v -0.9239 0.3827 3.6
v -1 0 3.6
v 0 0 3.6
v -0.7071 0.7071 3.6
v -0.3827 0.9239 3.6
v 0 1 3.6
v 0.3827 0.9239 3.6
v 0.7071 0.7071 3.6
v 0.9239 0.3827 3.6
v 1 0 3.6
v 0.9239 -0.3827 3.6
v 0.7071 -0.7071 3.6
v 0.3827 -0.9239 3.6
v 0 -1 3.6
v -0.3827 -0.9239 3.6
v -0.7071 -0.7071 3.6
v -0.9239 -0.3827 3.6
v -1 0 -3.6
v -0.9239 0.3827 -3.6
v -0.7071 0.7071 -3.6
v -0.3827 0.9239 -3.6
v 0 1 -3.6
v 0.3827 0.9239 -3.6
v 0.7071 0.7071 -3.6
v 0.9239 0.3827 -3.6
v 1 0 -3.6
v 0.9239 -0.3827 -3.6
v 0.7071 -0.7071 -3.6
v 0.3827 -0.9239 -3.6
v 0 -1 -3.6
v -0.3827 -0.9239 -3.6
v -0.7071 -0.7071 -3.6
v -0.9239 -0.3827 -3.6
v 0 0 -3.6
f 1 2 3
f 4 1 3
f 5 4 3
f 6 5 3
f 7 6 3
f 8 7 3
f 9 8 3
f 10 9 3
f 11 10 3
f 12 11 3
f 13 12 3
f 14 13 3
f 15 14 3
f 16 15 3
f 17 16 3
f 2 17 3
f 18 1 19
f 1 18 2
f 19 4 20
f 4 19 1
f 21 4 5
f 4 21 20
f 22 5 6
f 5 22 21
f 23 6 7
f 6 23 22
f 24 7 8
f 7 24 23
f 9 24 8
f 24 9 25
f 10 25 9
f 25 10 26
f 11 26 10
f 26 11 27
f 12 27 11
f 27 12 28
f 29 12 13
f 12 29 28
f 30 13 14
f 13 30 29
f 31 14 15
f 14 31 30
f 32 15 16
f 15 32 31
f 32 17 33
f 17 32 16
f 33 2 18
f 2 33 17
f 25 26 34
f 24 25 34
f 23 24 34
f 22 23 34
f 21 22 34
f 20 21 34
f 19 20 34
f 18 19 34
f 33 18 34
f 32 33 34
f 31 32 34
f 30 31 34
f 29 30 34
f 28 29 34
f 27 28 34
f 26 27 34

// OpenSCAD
// file: ../p/4-4edge.scad
use <../lib.scad>
function ldraw_lib__4_4edge() = [
// 0 Circle 1.0
// 0 Name: 4-4edge.dat
// 0 Author: James Jessiman
// 0 !LDRAW_ORG Primitive UPDATE 2017-01
// 0 !LICENSE Licensed under CC BY 2.0 and CC BY 4.0 : see CAreadme.txt
// 
// 0 BFC CERTIFY CCW
  [0,"BFC","CERTIFY"],
  [0,"BFC","CCW"],
// 
// 0 !HISTORY 1998-12-15 [PTadmin] Official Update 1998-10
// 0 !HISTORY 2005-12-28 [PTadmin] Official Update 2005-01
// 0 !HISTORY 2007-06-24 [PTadmin] Header formatted for Contributor Agreement
// 0 !HISTORY 2008-07-01 [PTadmin] Official Update 2008-01
// 0 !HISTORY 2017-01-15 [Steffen] BFCed
// 0 !HISTORY 2017-12-30 [PTadmin] Official Update 2017-01
// 
// 
// 2 24 1 0 0 0.9239 0 0.3827
  [2,24,1,0,0,0.9239,0,0.3827],
// 2 24 0.9239 0 0.3827 0.7071 0 0.7071
  [2,24,0.9239,0,0.3827,0.7071,0,0.7071],
// 2 24 0.7071 0 0.7071 0.3827 0 0.9239
  [2,24,0.7071,0,0.7071,0.3827,0,0.9239],
// 2 24 0.3827 0 0.9239 0 0 1
  [2,24,0.3827,0,0.9239,0,0,1],
// 2 24 0 0 1 -0.3827 0 0.9239
  [2,24,0,0,1,-0.3827,0,0.9239],
// 2 24 -0.3827 0 0.9239 -0.7071 0 0.7071
  [2,24,-0.3827,0,0.9239,-0.7071,0,0.7071],
// 2 24 -0.7071 0 0.7071 -0.9239 0 0.3827
  [2,24,-0.7071,0,0.7071,-0.9239,0,0.3827],
// 2 24 -0.9239 0 0.3827 -1 0 -0
  [2,24,-0.9239,0,0.3827,-1,0,-0],
// 2 24 -1 0 -0 -0.9239 0 -0.3827
  [2,24,-1,0,-0,-0.9239,0,-0.3827],
// 2 24 -0.9239 0 -0.3827 -0.7071 0 -0.7071
  [2,24,-0.9239,0,-0.3827,-0.7071,0,-0.7071],
// 2 24 -0.7071 0 -0.7071 -0.3827 0 -0.9239
  [2,24,-0.7071,0,-0.7071,-0.3827,0,-0.9239],
// 2 24 -0.3827 0 -0.9239 0 0 -1
  [2,24,-0.3827,0,-0.9239,0,0,-1],
// 2 24 0 0 -1 0.3827 0 -0.9239
  [2,24,0,0,-1,0.3827,0,-0.9239],
// 2 24 0.3827 0 -0.9239 0.7071 0 -0.7071
  [2,24,0.3827,0,-0.9239,0.7071,0,-0.7071],
// 2 24 0.7071 0 -0.7071 0.9239 0 -0.3827
  [2,24,0.7071,0,-0.7071,0.9239,0,-0.3827],
// 2 24 0.9239 0 -0.3827 1 0 0
  [2,24,0.9239,0,-0.3827,1,0,0],
];
module ldraw_lib__4_4edge(step=0, col=false, unit=2/5, alt=false, line=0.2, solid=!$preview)
    makepoly(ldraw_lib__4_4edge(), step=step, col=col, unit=unit, alt=alt, line=line, solid=solid);
ldraw_lib__4_4edge(line=0.2);
// file: ../p/4-4disc.scad
use <../lib.scad>
function ldraw_lib__4_4disc() = [
// 0 Disc 1.0
// 0 Name: 4-4disc.dat
// 0 Author: James Jessiman
// 0 !LDRAW_ORG Primitive UPDATE 2002-02
// 0 !LICENSE Licensed under CC BY 2.0 and CC BY 4.0 : see CAreadme.txt
// 
// 0 BFC CERTIFY CCW
  [0,"BFC","CERTIFY"],
  [0,"BFC","CCW"],
// 
// 0 !HISTORY 1998-12-15 [PTadmin] Official Update 1998-10
// 0 !HISTORY 2002-03-23 [sbliss] Added BFC statement
// 0 !HISTORY 2002-04-25 [PTadmin] Official Update 2002-02
// 0 !HISTORY 2007-06-24 [PTadmin] Header formatted for Contributor Agreement
// 0 !HISTORY 2008-07-01 [PTadmin] Official Update 2008-01
// 
// 
// 3 16 0 0 0 1 0 0 0.9239 0 0.3827
  [3,16,0,0,0,1,0,0,0.9239,0,0.3827],
// 3 16 0 0 0 0.9239 0 0.3827 0.7071 0 0.7071
  [3,16,0,0,0,0.9239,0,0.3827,0.7071,0,0.7071],
// 3 16 0 0 0 0.7071 0 0.7071 0.3827 0 0.9239
  [3,16,0,0,0,0.7071,0,0.7071,0.3827,0,0.9239],
// 3 16 0 0 0 0.3827 0 0.9239 0 0 1
  [3,16,0,0,0,0.3827,0,0.9239,0,0,1],
// 3 16 0 0 0 0 0 1 -0.3827 0 0.9239
  [3,16,0,0,0,0,0,1,-0.3827,0,0.9239],
// 3 16 0 0 0 -0.3827 0 0.9239 -0.7071 0 0.7071
  [3,16,0,0,0,-0.3827,0,0.9239,-0.7071,0,0.7071],
// 3 16 0 0 0 -0.7071 0 0.7071 -0.9239 0 0.3827
  [3,16,0,0,0,-0.7071,0,0.7071,-0.9239,0,0.3827],
// 3 16 0 0 0 -0.9239 0 0.3827 -1 0 -0
  [3,16,0,0,0,-0.9239,0,0.3827,-1,0,-0],
// 3 16 0 0 0 -1 0 -0 -0.9239 0 -0.3827
  [3,16,0,0,0,-1,0,-0,-0.9239,0,-0.3827],
// 3 16 0 0 0 -0.9239 0 -0.3827 -0.7071 0 -0.7071
  [3,16,0,0,0,-0.9239,0,-0.3827,-0.7071,0,-0.7071],
// 3 16 0 0 0 -0.7071 0 -0.7071 -0.3827 0 -0.9239
  [3,16,0,0,0,-0.7071,0,-0.7071,-0.3827,0,-0.9239],
// 3 16 0 0 0 -0.3827 0 -0.9239 0 0 -1
  [3,16,0,0,0,-0.3827,0,-0.9239,0,0,-1],
// 3 16 0 0 0 0 0 -1 0.3827 0 -0.9239
  [3,16,0,0,0,0,0,-1,0.3827,0,-0.9239],
// 3 16 0 0 0 0.3827 0 -0.9239 0.7071 0 -0.7071
  [3,16,0,0,0,0.3827,0,-0.9239,0.7071,0,-0.7071],
// 3 16 0 0 0 0.7071 0 -0.7071 0.9239 0 -0.3827
  [3,16,0,0,0,0.7071,0,-0.7071,0.9239,0,-0.3827],
// 3 16 0 0 0 0.9239 0 -0.3827 1 0 0
  [3,16,0,0,0,0.9239,0,-0.3827,1,0,0],
// 0
];
module ldraw_lib__4_4disc(step=0, col=false, unit=2/5, alt=false, line=0.2, solid=!$preview)
    makepoly(ldraw_lib__4_4disc(), step=step, col=col, unit=unit, alt=alt, line=line, solid=solid);
ldraw_lib__4_4disc(line=0.2);
// file: ../p/4-4cyli.scad
use <../lib.scad>
function ldraw_lib__4_4cyli() = [
// 0 Cylinder 1.0
// 0 Name: 4-4cyli.dat
// 0 Author: James Jessiman
// 0 !LDRAW_ORG Primitive UPDATE 2005-01
// 0 !LICENSE Licensed under CC BY 2.0 and CC BY 4.0 : see CAreadme.txt
// 
// 0 BFC CERTIFY CCW
  [0,"BFC","CERTIFY"],
  [0,"BFC","CCW"],
// 
// 0 !HISTORY 1998-12-15 [PTadmin] Official Update 1998-10
// 0 !HISTORY 2002-03-23 [sbliss] Added BFC statement; merged headers from files in distributions LDraw 0.27 and Complete.
// 0 !HISTORY 2002-04-25 [PTadmin] Official Update 2002-02
// 0 !HISTORY 2004-12-14 [guyvivan] BFC CCW
// 0 !HISTORY 2005-12-28 [PTadmin] Official Update 2005-01
// 0 !HISTORY 2007-06-24 [PTadmin] Header formatted for Contributor Agreement
// 0 !HISTORY 2008-07-01 [PTadmin] Official Update 2008-01
// 
// 
// 4 16 1 1 0 0.9239 1 0.3827 0.9239 0 0.3827 1 0 0
  [4,16,1,1,0,0.9239,1,0.3827,0.9239,0,0.3827,1,0,0],
// 5 24 1 0 0 1 1 0 0.9239 0 0.3827 0.9239 0 -0.3827
  [5,24,1,0,0,1,1,0,0.9239,0,0.3827,0.9239,0,-0.3827],
// 4 16 0.9239 1 0.3827 0.7071 1 0.7071 0.7071 0 0.7071 0.9239 0 0.3827
  [4,16,0.9239,1,0.3827,0.7071,1,0.7071,0.7071,0,0.7071,0.9239,0,0.3827],
// 5 24 0.9239 0 0.3827 0.9239 1 0.3827 0.7071 0 0.7071 1 0 0
  [5,24,0.9239,0,0.3827,0.9239,1,0.3827,0.7071,0,0.7071,1,0,0],
// 4 16 0.7071 1 0.7071 0.3827 1 0.9239 0.3827 0 0.9239 0.7071 0 0.7071
  [4,16,0.7071,1,0.7071,0.3827,1,0.9239,0.3827,0,0.9239,0.7071,0,0.7071],
// 5 24 0.7071 0 0.7071 0.7071 1 0.7071 0.3827 0 0.9239 0.9239 0 0.3827
  [5,24,0.7071,0,0.7071,0.7071,1,0.7071,0.3827,0,0.9239,0.9239,0,0.3827],
// 4 16 0.3827 1 0.9239 0 1 1 0 0 1 0.3827 0 0.9239
  [4,16,0.3827,1,0.9239,0,1,1,0,0,1,0.3827,0,0.9239],
// 5 24 0.3827 0 0.9239 0.3827 1 0.9239 0 0 1 0.7071 0 0.7071
  [5,24,0.3827,0,0.9239,0.3827,1,0.9239,0,0,1,0.7071,0,0.7071],
// 4 16 0 1 1 -0.3827 1 0.9239 -0.3827 0 0.9239 0 0 1
  [4,16,0,1,1,-0.3827,1,0.9239,-0.3827,0,0.9239,0,0,1],
// 5 24 0 0 1 0 1 1 -0.3827 0 0.9239 0.3827 0 0.9239
  [5,24,0,0,1,0,1,1,-0.3827,0,0.9239,0.3827,0,0.9239],
// 4 16 -0.3827 1 0.9239 -0.7071 1 0.7071 -0.7071 0 0.7071 -0.3827 0 0.9239
  [4,16,-0.3827,1,0.9239,-0.7071,1,0.7071,-0.7071,0,0.7071,-0.3827,0,0.9239],
// 5 24 -0.3827 0 0.9239 -0.3827 1 0.9239 -0.7071 0 0.7071 0 0 1
  [5,24,-0.3827,0,0.9239,-0.3827,1,0.9239,-0.7071,0,0.7071,0,0,1],
// 4 16 -0.7071 1 0.7071 -0.9239 1 0.3827 -0.9239 0 0.3827 -0.7071 0 0.7071
  [4,16,-0.7071,1,0.7071,-0.9239,1,0.3827,-0.9239,0,0.3827,-0.7071,0,0.7071],
// 5 24 -0.7071 0 0.7071 -0.7071 1 0.7071 -0.9239 0 0.3827 -0.3827 0 0.9239
  [5,24,-0.7071,0,0.7071,-0.7071,1,0.7071,-0.9239,0,0.3827,-0.3827,0,0.9239],
// 4 16 -0.9239 1 0.3827 -1 1 0 -1 0 0 -0.9239 0 0.3827
  [4,16,-0.9239,1,0.3827,-1,1,0,-1,0,0,-0.9239,0,0.3827],
// 5 24 -0.9239 0 0.3827 -0.9239 1 0.3827 -1 0 0 -0.7071 0 0.7071
  [5,24,-0.9239,0,0.3827,-0.9239,1,0.3827,-1,0,0,-0.7071,0,0.7071],
// 4 16 -1 1 0 -0.9239 1 -0.3827 -0.9239 0 -0.3827 -1 0 0
  [4,16,-1,1,0,-0.9239,1,-0.3827,-0.9239,0,-0.3827,-1,0,0],
// 5 24 -1 0 0 -1 1 0 -0.9239 0 -0.3827 -0.9239 0 0.3827
  [5,24,-1,0,0,-1,1,0,-0.9239,0,-0.3827,-0.9239,0,0.3827],
// 4 16 -0.9239 1 -0.3827 -0.7071 1 -0.7071 -0.7071 0 -0.7071 -0.9239 0 -0.3827
  [4,16,-0.9239,1,-0.3827,-0.7071,1,-0.7071,-0.7071,0,-0.7071,-0.9239,0,-0.3827],
// 5 24 -0.9239 0 -0.3827 -0.9239 1 -0.3827 -0.7071 0 -0.7071 -1 0 0
  [5,24,-0.9239,0,-0.3827,-0.9239,1,-0.3827,-0.7071,0,-0.7071,-1,0,0],
// 4 16 -0.7071 1 -0.7071 -0.3827 1 -0.9239 -0.3827 0 -0.9239 -0.7071 0 -0.7071
  [4,16,-0.7071,1,-0.7071,-0.3827,1,-0.9239,-0.3827,0,-0.9239,-0.7071,0,-0.7071],
// 5 24 -0.7071 0 -0.7071 -0.7071 1 -0.7071 -0.3827 0 -0.9239 -0.9239 0 -0.3827
  [5,24,-0.7071,0,-0.7071,-0.7071,1,-0.7071,-0.3827,0,-0.9239,-0.9239,0,-0.3827],
// 4 16 -0.3827 1 -0.9239 0 1 -1 0 0 -1 -0.3827 0 -0.9239
  [4,16,-0.3827,1,-0.9239,0,1,-1,0,0,-1,-0.3827,0,-0.9239],
// 5 24 -0.3827 0 -0.9239 -0.3827 1 -0.9239 0 0 -1 -0.7071 0 -0.7071
  [5,24,-0.3827,0,-0.9239,-0.3827,1,-0.9239,0,0,-1,-0.7071,0,-0.7071],
// 4 16 0 1 -1 0.3827 1 -0.9239 0.3827 0 -0.9239 0 0 -1
  [4,16,0,1,-1,0.3827,1,-0.9239,0.3827,0,-0.9239,0,0,-1],
// 5 24 0 0 -1 0 1 -1 0.3827 0 -0.9239 -0.3827 0 -0.9239
  [5,24,0,0,-1,0,1,-1,0.3827,0,-0.9239,-0.3827,0,-0.9239],
// 4 16 0.3827 1 -0.9239 0.7071 1 -0.7071 0.7071 0 -0.7071 0.3827 0 -0.9239
  [4,16,0.3827,1,-0.9239,0.7071,1,-0.7071,0.7071,0,-0.7071,0.3827,0,-0.9239],
// 5 24 0.3827 0 -0.9239 0.3827 1 -0.9239 0.7071 0 -0.7071 0 0 -1
  [5,24,0.3827,0,-0.9239,0.3827,1,-0.9239,0.7071,0,-0.7071,0,0,-1],
// 4 16 0.7071 1 -0.7071 0.9239 1 -0.3827 0.9239 0 -0.3827 0.7071 0 -0.7071
  [4,16,0.7071,1,-0.7071,0.9239,1,-0.3827,0.9239,0,-0.3827,0.7071,0,-0.7071],
// 5 24 0.7071 0 -0.7071 0.7071 1 -0.7071 0.9239 0 -0.3827 0.3827 0 -0.9239
  [5,24,0.7071,0,-0.7071,0.7071,1,-0.7071,0.9239,0,-0.3827,0.3827,0,-0.9239],
// 4 16 0.9239 1 -0.3827 1 1 0 1 0 0 0.9239 0 -0.3827
  [4,16,0.9239,1,-0.3827,1,1,0,1,0,0,0.9239,0,-0.3827],
// 5 24 0.9239 0 -0.3827 0.9239 1 -0.3827 1 0 0 0.7071 0 -0.7071
  [5,24,0.9239,0,-0.3827,0.9239,1,-0.3827,1,0,0,0.7071,0,-0.7071],
// 0
];
module ldraw_lib__4_4cyli(step=0, col=false, unit=2/5, alt=false, line=0.2, solid=!$preview)
    makepoly(ldraw_lib__4_4cyli(), step=step, col=col, unit=unit, alt=alt, line=line, solid=solid);
ldraw_lib__4_4cyli(line=0.2);
// main file
use <../lib.scad>
use <../p/4-4cyli.scad>
use <../p/4-4disc.scad>
use <../p/4-4edge.scad>
function ldraw_lib__2705() = [
// 0 Technic Action Figure Arm Bearing Pin
// 0 Name: 2705.dat
// 0 Author: Donald Sutter [technog]
// 0 !LDRAW_ORG Part UPDATE 2012-01
// 0 !LICENSE Licensed under CC BY 2.0 and CC BY 4.0 : see CAreadme.txt
// 
// 0 BFC CERTIFY CW
  [0,"BFC","CERTIFY"],
  [0,"BFC","CW"],
// 
// 0 !CATEGORY Figure
// 
// 0 !HISTORY 2009-05-02 [PTadmin] Official Update 2009-01
// 0 !HISTORY 2012-03-30 [PTadmin] Official Update 2012-01
// 
// 
// 1 16 0 -9 0 -2.5 0 0 0 1 0 0 0 2.5 4-4disc.dat
  [1,16,0,-9,0,-2.5,0,0,0,1,0,0,0,2.5, ldraw_lib__4_4disc()],
// 1 16 0 -9 0 -2.5 0 0 0 1 0 0 0 2.5 4-4edge.dat
  [1,16,0,-9,0,-2.5,0,0,0,1,0,0,0,2.5, ldraw_lib__4_4edge()],
// 1 16 0 9 0 -2.5 0 0 0 -18 0 0 0 2.5 4-4cyli.dat
  [1,16,0,9,0,-2.5,0,0,0,-18,0,0,0,2.5, ldraw_lib__4_4cyli()],
// 1 16 0 9 0 -2.5 0 0 0 1 0 0 0 2.5 4-4edge.dat
  [1,16,0,9,0,-2.5,0,0,0,1,0,0,0,2.5, ldraw_lib__4_4edge()],
// 1 16 0 9 0 2.5 0 0 0 -1 0 0 0 2.5 4-4disc.dat
  [1,16,0,9,0,2.5,0,0,0,-1,0,0,0,2.5, ldraw_lib__4_4disc()],
];
module ldraw_lib__2705(step=0, col=false, unit=2/5, alt=false, line=0.2, solid=!$preview)
    makepoly(ldraw_lib__2705(), step=step, col=col, unit=unit, alt=alt, line=line, solid=solid);
ldraw_lib__2705(line=0.2);
